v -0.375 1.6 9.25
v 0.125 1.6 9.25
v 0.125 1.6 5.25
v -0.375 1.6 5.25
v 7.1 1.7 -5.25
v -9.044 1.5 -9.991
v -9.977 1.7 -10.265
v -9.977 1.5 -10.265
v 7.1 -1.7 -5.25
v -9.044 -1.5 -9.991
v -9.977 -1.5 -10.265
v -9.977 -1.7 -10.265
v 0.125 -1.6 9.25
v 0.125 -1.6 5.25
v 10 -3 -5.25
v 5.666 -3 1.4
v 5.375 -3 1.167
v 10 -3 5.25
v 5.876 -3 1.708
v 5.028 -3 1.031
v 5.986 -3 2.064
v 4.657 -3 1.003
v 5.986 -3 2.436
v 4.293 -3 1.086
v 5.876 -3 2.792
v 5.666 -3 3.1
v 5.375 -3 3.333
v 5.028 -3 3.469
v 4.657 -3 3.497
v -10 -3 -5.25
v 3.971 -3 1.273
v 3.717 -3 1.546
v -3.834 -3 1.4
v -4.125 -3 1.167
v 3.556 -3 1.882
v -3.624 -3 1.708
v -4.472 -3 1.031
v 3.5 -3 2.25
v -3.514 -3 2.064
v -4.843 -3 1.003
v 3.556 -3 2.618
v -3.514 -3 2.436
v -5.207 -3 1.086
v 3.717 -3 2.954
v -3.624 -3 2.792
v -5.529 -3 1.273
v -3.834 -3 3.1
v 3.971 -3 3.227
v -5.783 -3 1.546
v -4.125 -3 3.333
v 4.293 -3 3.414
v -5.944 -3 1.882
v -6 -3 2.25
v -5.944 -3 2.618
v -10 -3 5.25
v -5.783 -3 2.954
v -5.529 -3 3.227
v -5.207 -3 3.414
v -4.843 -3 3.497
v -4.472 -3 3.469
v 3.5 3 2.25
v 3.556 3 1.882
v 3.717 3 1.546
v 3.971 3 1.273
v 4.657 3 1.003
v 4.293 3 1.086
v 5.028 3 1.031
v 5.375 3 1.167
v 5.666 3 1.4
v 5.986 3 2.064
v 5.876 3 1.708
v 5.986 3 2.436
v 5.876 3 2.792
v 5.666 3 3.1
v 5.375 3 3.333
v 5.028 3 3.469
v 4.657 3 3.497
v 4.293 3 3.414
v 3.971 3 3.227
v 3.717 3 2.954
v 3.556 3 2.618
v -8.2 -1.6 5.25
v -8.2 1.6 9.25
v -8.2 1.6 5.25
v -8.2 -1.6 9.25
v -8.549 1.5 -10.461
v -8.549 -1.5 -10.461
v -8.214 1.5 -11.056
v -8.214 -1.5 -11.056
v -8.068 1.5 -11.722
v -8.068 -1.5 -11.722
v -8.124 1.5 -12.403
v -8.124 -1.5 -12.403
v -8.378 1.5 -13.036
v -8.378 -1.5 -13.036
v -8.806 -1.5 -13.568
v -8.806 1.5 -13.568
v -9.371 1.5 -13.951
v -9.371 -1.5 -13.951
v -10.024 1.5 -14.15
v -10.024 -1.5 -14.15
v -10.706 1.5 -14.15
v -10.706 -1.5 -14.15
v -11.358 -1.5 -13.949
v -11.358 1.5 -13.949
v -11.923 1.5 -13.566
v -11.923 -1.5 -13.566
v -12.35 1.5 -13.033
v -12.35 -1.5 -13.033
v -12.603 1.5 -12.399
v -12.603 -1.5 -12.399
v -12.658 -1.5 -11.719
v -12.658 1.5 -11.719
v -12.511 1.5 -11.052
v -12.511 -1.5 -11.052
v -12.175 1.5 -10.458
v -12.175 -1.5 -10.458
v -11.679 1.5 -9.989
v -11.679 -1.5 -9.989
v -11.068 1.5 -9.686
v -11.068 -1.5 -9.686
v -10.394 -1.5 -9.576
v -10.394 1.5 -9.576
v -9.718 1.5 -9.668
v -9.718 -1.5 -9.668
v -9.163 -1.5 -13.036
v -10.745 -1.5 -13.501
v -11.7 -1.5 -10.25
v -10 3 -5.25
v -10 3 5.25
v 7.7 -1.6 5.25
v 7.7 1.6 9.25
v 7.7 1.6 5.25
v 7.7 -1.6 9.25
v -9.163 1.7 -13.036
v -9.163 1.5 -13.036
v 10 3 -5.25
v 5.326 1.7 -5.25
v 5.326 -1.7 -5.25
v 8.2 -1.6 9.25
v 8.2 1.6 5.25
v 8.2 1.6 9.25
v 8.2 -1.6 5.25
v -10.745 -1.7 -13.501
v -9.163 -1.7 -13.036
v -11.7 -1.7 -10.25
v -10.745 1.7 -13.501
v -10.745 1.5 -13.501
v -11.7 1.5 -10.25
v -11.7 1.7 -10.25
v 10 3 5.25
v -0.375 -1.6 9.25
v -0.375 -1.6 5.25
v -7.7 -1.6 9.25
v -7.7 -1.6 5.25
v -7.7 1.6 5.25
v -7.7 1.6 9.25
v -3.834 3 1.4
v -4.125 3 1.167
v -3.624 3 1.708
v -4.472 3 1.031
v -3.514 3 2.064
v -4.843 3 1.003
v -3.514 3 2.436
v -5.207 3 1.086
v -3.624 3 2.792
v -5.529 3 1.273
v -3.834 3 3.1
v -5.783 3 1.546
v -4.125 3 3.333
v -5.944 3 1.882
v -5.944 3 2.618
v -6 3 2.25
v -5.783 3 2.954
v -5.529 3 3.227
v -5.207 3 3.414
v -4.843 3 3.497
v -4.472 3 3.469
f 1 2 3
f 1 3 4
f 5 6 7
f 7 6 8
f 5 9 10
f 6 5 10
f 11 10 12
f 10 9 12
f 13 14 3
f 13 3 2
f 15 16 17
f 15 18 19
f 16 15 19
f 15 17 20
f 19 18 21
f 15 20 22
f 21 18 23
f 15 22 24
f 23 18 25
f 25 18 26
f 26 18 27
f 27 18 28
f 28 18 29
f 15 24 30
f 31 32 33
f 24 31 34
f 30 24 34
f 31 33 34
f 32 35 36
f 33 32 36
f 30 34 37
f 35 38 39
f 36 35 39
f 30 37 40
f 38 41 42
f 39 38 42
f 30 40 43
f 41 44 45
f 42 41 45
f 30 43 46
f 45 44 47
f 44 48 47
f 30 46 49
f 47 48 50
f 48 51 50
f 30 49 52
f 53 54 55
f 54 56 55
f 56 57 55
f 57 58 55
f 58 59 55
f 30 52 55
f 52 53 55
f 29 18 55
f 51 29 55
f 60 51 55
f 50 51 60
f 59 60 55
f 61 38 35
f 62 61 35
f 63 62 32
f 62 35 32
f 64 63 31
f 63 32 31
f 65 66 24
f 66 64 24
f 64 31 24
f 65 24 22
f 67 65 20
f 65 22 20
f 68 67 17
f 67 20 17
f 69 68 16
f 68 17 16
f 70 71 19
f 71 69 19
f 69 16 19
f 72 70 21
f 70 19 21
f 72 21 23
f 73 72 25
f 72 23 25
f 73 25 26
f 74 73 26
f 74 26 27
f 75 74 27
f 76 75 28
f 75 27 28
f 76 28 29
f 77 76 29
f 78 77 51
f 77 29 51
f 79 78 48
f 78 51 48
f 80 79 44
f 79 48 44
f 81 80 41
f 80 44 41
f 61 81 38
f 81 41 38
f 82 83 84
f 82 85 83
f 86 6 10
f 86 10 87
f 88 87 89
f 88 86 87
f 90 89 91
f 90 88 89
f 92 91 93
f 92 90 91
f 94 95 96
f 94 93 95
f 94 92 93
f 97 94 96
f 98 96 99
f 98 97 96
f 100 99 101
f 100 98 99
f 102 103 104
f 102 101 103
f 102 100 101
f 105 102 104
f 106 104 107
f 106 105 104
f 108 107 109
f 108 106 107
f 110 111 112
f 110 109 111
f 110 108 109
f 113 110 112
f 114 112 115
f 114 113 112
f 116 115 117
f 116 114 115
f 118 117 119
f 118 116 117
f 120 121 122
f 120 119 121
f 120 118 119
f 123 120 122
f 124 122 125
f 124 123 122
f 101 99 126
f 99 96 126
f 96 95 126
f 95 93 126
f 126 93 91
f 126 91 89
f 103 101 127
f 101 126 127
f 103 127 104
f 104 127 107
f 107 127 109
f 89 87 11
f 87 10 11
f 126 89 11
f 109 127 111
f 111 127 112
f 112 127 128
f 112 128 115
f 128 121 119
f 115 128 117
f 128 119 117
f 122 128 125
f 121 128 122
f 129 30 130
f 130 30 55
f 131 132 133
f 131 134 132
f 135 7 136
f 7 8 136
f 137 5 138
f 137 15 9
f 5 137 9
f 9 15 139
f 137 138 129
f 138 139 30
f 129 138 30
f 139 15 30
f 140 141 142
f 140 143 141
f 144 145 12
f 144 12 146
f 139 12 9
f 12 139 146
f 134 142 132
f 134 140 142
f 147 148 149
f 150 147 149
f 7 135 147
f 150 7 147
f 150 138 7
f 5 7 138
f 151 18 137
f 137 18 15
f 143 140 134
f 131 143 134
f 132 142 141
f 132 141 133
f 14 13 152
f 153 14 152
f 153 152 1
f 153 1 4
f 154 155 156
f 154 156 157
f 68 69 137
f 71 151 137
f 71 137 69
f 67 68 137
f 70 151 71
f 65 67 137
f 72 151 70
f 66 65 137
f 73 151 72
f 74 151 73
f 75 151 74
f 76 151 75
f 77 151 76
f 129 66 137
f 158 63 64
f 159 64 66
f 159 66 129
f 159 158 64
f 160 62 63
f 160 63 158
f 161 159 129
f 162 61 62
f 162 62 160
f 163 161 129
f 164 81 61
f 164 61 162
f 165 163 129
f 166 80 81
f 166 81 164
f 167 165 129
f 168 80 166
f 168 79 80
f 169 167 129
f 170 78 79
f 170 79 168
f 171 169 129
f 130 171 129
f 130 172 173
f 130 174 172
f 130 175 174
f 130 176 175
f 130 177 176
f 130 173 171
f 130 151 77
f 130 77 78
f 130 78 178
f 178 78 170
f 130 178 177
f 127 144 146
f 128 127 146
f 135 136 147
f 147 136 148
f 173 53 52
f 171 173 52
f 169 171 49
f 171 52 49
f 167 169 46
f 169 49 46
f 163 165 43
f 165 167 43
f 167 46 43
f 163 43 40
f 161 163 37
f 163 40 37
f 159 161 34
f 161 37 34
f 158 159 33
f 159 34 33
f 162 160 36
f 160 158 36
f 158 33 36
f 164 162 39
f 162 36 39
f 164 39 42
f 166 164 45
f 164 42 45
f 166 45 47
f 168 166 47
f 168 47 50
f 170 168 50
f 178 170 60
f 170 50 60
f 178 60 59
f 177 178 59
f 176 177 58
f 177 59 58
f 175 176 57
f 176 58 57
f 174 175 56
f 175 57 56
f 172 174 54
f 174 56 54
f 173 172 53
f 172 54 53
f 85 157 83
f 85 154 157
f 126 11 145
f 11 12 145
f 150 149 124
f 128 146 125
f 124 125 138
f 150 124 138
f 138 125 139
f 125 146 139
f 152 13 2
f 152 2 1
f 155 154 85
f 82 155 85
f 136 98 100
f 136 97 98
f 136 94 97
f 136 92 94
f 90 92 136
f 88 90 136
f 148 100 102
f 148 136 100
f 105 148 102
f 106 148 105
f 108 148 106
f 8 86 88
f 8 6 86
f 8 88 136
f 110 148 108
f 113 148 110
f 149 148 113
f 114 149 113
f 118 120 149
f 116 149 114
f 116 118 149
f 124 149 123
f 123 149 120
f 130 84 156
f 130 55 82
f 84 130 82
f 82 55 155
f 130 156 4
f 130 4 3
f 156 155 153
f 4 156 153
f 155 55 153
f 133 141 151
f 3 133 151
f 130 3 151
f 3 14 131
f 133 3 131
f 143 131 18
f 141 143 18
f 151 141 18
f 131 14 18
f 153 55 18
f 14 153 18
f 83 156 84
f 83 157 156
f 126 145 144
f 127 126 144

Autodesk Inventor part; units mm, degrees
ref_plane "YZ Plane" through (0, 0, 0) normal (1, 0, 0) x (0, 1, 0)
ref_plane "XZ Plane" through (0, 0, 0) normal (0, 1, 0) x (-1, 0, 0)
ref_plane "XY Plane" through (0, 0, 0) normal (0, 0, 1) x (1, 0, 0)
sketch "Skizze1" plane through (0, 0, 0) normal (0, 1, 0) x (-1, 0, 0)
  line L0 (-10, -5.25) -> (10, -5.25)
  line L1 (10, -5.25) -> (10, 5.25)
  line L2 (10, 5.25) -> (-10, 5.25)
  line L3 (-10, 5.25) -> (-10, -5.25)
  line L4 (-10, -5.25) -> (10, 5.25) construction
  line L5 (10, -5.25) -> (-10, 5.25) construction
  circle A0 centre (4.75, 2.25) radius 1.25
  circle A1 centre (-4.75, 2.25) radius 1.25
  point P0 (0, 0)
  dimension "d0" = 20
  dimension "d1" = 10.5
  dimension "d4" = 2.5
  dimension "d5" = 2.5
  dimension "d6" = 4.75
  dimension "d7" = 3
  dimension "d8" = 3
  dimension "d9" = 4.75
extrude "Extrusion1" add sketch "Skizze1" along normal mid plane 6
sketch "Skizze2" plane through (0, 0, 0) normal (0, 1, 0) x (-1, 0, 0)
  line L0 (10, -5.25) -> (10, 5.25) projected
  line L1 (10, 5.25) -> (-10, 5.25) projected
  line L2 (-10, 5.25) -> (-10, -5.25) projected
  line L3 (-10, -5.25) -> (10, -5.25) projected
  circle A0 centre (4.75, 2.25) radius 1.25 projected
  circle A1 centre (-4.75, 2.25) radius 1.25 projected
  line L4 (10, 5.25) -> (-10, 5.25) projected
  line L5 (8.2, 5.25) -> (7.7, 5.25)
  line L6 (7.7, 5.25) -> (7.7, 9.25)
  line L7 (7.7, 9.25) -> (8.2, 9.25)
  line L8 (8.2, 9.25) -> (8.2, 5.25)
  line L9 (0.3746, 5.25) -> (-0.1254, 5.25)
  line L10 (-0.1254, 5.25) -> (-0.1254, 9.25)
  line L11 (-0.1254, 9.25) -> (0.3746, 9.25)
  line L12 (0.3746, 9.25) -> (0.3746, 5.25)
  line L13 (-7.7, 5.25) -> (-8.2, 5.25)
  line L14 (-8.2, 5.25) -> (-8.2, 9.25)
  line L15 (-8.2, 9.25) -> (-7.7, 9.25)
  line L16 (-7.7, 9.25) -> (-7.7, 5.25)
  point P0 (0, 0)
  dimension "d10" = 0.5
  dimension "d11" = 4
  dimension "d12" = 1.8
  dimension "d13" = 1.8
  dimension "d14" = 0.5
  dimension "d15" = 0.5
extrude "Extrusion2" add sketch "Skizze2" along normal mid plane 3.2 contours L1 L6 L7 L8 | L14 L15 L16 L1 | L1 L10 L11 L12
sketch "Skizze3" plane through (0, 0, 0) normal (0, 1, 0) x (-1, 0, 0)
  line L0 (10, -5.25) -> (10, 5.25) projected
  line L1 (10, 5.25) -> (-10, 5.25) projected
  line L2 (-10, 5.25) -> (-10, -5.25) projected
  line L3 (-10, -5.25) -> (10, -5.25) projected
  circle A0 centre (4.75, 2.25) radius 1.25 projected
  circle A1 centre (-4.75, 2.25) radius 1.25 projected
  line L4 (10, -5.25) -> (-10, -5.25) projected
  line L5 (-7.1, -5.25) -> (9.9766, -10.265)
  line L6 (9.9766, -10.265) -> (9.1627, -13.0362)
  line L7 (9.1627, -13.0362) -> (10.7453, -13.501)
  line L8 (10.7453, -13.501) -> (11.7, -10.25)
  line L9 (11.7, -10.25) -> (-5.3255, -5.25)
  point P0 (0, 0)
  dimension "d18" = 2.9
  dimension "d19" = 0.5
  dimension "d20" = 1.7
  dimension "d21" = 5
extrude "Extrusion3" add sketch "Skizze3" along normal mid plane 3.4 contours L9 L8 L7 L6 L5 L3
sketch "Skizze4" plane through (0, 0, 0) normal (0, 1, 0) x (-1, 0, 0)
  line L0 (11.7, -10.25) -> (-5.3255, -5.25) projected
  line L1 (-7.1, -5.25) -> (-5.3255, -5.25) projected
  line L2 (-7.1, -5.25) -> (9.9766, -10.265) projected
  line L3 (9.9766, -10.265) -> (9.1627, -13.0362) projected
  line L4 (9.1627, -13.0362) -> (10.7453, -13.501) projected
  line L5 (10.7453, -13.501) -> (11.7, -10.25) projected
  circle A0 centre (10.3631, -11.8755) radius 2.3
  point P0 (0, 0)
  dimension "d24" = 4.6
extrude "Extrusion4" add sketch "Skizze4" along normal mid plane 3 contours L5 L4 L3 L2 A0 L0 | L0 A0 L2 L3 L4 L5
properties part number "00_Endstop_mechanical_vuniversum_microswitch_roll"
